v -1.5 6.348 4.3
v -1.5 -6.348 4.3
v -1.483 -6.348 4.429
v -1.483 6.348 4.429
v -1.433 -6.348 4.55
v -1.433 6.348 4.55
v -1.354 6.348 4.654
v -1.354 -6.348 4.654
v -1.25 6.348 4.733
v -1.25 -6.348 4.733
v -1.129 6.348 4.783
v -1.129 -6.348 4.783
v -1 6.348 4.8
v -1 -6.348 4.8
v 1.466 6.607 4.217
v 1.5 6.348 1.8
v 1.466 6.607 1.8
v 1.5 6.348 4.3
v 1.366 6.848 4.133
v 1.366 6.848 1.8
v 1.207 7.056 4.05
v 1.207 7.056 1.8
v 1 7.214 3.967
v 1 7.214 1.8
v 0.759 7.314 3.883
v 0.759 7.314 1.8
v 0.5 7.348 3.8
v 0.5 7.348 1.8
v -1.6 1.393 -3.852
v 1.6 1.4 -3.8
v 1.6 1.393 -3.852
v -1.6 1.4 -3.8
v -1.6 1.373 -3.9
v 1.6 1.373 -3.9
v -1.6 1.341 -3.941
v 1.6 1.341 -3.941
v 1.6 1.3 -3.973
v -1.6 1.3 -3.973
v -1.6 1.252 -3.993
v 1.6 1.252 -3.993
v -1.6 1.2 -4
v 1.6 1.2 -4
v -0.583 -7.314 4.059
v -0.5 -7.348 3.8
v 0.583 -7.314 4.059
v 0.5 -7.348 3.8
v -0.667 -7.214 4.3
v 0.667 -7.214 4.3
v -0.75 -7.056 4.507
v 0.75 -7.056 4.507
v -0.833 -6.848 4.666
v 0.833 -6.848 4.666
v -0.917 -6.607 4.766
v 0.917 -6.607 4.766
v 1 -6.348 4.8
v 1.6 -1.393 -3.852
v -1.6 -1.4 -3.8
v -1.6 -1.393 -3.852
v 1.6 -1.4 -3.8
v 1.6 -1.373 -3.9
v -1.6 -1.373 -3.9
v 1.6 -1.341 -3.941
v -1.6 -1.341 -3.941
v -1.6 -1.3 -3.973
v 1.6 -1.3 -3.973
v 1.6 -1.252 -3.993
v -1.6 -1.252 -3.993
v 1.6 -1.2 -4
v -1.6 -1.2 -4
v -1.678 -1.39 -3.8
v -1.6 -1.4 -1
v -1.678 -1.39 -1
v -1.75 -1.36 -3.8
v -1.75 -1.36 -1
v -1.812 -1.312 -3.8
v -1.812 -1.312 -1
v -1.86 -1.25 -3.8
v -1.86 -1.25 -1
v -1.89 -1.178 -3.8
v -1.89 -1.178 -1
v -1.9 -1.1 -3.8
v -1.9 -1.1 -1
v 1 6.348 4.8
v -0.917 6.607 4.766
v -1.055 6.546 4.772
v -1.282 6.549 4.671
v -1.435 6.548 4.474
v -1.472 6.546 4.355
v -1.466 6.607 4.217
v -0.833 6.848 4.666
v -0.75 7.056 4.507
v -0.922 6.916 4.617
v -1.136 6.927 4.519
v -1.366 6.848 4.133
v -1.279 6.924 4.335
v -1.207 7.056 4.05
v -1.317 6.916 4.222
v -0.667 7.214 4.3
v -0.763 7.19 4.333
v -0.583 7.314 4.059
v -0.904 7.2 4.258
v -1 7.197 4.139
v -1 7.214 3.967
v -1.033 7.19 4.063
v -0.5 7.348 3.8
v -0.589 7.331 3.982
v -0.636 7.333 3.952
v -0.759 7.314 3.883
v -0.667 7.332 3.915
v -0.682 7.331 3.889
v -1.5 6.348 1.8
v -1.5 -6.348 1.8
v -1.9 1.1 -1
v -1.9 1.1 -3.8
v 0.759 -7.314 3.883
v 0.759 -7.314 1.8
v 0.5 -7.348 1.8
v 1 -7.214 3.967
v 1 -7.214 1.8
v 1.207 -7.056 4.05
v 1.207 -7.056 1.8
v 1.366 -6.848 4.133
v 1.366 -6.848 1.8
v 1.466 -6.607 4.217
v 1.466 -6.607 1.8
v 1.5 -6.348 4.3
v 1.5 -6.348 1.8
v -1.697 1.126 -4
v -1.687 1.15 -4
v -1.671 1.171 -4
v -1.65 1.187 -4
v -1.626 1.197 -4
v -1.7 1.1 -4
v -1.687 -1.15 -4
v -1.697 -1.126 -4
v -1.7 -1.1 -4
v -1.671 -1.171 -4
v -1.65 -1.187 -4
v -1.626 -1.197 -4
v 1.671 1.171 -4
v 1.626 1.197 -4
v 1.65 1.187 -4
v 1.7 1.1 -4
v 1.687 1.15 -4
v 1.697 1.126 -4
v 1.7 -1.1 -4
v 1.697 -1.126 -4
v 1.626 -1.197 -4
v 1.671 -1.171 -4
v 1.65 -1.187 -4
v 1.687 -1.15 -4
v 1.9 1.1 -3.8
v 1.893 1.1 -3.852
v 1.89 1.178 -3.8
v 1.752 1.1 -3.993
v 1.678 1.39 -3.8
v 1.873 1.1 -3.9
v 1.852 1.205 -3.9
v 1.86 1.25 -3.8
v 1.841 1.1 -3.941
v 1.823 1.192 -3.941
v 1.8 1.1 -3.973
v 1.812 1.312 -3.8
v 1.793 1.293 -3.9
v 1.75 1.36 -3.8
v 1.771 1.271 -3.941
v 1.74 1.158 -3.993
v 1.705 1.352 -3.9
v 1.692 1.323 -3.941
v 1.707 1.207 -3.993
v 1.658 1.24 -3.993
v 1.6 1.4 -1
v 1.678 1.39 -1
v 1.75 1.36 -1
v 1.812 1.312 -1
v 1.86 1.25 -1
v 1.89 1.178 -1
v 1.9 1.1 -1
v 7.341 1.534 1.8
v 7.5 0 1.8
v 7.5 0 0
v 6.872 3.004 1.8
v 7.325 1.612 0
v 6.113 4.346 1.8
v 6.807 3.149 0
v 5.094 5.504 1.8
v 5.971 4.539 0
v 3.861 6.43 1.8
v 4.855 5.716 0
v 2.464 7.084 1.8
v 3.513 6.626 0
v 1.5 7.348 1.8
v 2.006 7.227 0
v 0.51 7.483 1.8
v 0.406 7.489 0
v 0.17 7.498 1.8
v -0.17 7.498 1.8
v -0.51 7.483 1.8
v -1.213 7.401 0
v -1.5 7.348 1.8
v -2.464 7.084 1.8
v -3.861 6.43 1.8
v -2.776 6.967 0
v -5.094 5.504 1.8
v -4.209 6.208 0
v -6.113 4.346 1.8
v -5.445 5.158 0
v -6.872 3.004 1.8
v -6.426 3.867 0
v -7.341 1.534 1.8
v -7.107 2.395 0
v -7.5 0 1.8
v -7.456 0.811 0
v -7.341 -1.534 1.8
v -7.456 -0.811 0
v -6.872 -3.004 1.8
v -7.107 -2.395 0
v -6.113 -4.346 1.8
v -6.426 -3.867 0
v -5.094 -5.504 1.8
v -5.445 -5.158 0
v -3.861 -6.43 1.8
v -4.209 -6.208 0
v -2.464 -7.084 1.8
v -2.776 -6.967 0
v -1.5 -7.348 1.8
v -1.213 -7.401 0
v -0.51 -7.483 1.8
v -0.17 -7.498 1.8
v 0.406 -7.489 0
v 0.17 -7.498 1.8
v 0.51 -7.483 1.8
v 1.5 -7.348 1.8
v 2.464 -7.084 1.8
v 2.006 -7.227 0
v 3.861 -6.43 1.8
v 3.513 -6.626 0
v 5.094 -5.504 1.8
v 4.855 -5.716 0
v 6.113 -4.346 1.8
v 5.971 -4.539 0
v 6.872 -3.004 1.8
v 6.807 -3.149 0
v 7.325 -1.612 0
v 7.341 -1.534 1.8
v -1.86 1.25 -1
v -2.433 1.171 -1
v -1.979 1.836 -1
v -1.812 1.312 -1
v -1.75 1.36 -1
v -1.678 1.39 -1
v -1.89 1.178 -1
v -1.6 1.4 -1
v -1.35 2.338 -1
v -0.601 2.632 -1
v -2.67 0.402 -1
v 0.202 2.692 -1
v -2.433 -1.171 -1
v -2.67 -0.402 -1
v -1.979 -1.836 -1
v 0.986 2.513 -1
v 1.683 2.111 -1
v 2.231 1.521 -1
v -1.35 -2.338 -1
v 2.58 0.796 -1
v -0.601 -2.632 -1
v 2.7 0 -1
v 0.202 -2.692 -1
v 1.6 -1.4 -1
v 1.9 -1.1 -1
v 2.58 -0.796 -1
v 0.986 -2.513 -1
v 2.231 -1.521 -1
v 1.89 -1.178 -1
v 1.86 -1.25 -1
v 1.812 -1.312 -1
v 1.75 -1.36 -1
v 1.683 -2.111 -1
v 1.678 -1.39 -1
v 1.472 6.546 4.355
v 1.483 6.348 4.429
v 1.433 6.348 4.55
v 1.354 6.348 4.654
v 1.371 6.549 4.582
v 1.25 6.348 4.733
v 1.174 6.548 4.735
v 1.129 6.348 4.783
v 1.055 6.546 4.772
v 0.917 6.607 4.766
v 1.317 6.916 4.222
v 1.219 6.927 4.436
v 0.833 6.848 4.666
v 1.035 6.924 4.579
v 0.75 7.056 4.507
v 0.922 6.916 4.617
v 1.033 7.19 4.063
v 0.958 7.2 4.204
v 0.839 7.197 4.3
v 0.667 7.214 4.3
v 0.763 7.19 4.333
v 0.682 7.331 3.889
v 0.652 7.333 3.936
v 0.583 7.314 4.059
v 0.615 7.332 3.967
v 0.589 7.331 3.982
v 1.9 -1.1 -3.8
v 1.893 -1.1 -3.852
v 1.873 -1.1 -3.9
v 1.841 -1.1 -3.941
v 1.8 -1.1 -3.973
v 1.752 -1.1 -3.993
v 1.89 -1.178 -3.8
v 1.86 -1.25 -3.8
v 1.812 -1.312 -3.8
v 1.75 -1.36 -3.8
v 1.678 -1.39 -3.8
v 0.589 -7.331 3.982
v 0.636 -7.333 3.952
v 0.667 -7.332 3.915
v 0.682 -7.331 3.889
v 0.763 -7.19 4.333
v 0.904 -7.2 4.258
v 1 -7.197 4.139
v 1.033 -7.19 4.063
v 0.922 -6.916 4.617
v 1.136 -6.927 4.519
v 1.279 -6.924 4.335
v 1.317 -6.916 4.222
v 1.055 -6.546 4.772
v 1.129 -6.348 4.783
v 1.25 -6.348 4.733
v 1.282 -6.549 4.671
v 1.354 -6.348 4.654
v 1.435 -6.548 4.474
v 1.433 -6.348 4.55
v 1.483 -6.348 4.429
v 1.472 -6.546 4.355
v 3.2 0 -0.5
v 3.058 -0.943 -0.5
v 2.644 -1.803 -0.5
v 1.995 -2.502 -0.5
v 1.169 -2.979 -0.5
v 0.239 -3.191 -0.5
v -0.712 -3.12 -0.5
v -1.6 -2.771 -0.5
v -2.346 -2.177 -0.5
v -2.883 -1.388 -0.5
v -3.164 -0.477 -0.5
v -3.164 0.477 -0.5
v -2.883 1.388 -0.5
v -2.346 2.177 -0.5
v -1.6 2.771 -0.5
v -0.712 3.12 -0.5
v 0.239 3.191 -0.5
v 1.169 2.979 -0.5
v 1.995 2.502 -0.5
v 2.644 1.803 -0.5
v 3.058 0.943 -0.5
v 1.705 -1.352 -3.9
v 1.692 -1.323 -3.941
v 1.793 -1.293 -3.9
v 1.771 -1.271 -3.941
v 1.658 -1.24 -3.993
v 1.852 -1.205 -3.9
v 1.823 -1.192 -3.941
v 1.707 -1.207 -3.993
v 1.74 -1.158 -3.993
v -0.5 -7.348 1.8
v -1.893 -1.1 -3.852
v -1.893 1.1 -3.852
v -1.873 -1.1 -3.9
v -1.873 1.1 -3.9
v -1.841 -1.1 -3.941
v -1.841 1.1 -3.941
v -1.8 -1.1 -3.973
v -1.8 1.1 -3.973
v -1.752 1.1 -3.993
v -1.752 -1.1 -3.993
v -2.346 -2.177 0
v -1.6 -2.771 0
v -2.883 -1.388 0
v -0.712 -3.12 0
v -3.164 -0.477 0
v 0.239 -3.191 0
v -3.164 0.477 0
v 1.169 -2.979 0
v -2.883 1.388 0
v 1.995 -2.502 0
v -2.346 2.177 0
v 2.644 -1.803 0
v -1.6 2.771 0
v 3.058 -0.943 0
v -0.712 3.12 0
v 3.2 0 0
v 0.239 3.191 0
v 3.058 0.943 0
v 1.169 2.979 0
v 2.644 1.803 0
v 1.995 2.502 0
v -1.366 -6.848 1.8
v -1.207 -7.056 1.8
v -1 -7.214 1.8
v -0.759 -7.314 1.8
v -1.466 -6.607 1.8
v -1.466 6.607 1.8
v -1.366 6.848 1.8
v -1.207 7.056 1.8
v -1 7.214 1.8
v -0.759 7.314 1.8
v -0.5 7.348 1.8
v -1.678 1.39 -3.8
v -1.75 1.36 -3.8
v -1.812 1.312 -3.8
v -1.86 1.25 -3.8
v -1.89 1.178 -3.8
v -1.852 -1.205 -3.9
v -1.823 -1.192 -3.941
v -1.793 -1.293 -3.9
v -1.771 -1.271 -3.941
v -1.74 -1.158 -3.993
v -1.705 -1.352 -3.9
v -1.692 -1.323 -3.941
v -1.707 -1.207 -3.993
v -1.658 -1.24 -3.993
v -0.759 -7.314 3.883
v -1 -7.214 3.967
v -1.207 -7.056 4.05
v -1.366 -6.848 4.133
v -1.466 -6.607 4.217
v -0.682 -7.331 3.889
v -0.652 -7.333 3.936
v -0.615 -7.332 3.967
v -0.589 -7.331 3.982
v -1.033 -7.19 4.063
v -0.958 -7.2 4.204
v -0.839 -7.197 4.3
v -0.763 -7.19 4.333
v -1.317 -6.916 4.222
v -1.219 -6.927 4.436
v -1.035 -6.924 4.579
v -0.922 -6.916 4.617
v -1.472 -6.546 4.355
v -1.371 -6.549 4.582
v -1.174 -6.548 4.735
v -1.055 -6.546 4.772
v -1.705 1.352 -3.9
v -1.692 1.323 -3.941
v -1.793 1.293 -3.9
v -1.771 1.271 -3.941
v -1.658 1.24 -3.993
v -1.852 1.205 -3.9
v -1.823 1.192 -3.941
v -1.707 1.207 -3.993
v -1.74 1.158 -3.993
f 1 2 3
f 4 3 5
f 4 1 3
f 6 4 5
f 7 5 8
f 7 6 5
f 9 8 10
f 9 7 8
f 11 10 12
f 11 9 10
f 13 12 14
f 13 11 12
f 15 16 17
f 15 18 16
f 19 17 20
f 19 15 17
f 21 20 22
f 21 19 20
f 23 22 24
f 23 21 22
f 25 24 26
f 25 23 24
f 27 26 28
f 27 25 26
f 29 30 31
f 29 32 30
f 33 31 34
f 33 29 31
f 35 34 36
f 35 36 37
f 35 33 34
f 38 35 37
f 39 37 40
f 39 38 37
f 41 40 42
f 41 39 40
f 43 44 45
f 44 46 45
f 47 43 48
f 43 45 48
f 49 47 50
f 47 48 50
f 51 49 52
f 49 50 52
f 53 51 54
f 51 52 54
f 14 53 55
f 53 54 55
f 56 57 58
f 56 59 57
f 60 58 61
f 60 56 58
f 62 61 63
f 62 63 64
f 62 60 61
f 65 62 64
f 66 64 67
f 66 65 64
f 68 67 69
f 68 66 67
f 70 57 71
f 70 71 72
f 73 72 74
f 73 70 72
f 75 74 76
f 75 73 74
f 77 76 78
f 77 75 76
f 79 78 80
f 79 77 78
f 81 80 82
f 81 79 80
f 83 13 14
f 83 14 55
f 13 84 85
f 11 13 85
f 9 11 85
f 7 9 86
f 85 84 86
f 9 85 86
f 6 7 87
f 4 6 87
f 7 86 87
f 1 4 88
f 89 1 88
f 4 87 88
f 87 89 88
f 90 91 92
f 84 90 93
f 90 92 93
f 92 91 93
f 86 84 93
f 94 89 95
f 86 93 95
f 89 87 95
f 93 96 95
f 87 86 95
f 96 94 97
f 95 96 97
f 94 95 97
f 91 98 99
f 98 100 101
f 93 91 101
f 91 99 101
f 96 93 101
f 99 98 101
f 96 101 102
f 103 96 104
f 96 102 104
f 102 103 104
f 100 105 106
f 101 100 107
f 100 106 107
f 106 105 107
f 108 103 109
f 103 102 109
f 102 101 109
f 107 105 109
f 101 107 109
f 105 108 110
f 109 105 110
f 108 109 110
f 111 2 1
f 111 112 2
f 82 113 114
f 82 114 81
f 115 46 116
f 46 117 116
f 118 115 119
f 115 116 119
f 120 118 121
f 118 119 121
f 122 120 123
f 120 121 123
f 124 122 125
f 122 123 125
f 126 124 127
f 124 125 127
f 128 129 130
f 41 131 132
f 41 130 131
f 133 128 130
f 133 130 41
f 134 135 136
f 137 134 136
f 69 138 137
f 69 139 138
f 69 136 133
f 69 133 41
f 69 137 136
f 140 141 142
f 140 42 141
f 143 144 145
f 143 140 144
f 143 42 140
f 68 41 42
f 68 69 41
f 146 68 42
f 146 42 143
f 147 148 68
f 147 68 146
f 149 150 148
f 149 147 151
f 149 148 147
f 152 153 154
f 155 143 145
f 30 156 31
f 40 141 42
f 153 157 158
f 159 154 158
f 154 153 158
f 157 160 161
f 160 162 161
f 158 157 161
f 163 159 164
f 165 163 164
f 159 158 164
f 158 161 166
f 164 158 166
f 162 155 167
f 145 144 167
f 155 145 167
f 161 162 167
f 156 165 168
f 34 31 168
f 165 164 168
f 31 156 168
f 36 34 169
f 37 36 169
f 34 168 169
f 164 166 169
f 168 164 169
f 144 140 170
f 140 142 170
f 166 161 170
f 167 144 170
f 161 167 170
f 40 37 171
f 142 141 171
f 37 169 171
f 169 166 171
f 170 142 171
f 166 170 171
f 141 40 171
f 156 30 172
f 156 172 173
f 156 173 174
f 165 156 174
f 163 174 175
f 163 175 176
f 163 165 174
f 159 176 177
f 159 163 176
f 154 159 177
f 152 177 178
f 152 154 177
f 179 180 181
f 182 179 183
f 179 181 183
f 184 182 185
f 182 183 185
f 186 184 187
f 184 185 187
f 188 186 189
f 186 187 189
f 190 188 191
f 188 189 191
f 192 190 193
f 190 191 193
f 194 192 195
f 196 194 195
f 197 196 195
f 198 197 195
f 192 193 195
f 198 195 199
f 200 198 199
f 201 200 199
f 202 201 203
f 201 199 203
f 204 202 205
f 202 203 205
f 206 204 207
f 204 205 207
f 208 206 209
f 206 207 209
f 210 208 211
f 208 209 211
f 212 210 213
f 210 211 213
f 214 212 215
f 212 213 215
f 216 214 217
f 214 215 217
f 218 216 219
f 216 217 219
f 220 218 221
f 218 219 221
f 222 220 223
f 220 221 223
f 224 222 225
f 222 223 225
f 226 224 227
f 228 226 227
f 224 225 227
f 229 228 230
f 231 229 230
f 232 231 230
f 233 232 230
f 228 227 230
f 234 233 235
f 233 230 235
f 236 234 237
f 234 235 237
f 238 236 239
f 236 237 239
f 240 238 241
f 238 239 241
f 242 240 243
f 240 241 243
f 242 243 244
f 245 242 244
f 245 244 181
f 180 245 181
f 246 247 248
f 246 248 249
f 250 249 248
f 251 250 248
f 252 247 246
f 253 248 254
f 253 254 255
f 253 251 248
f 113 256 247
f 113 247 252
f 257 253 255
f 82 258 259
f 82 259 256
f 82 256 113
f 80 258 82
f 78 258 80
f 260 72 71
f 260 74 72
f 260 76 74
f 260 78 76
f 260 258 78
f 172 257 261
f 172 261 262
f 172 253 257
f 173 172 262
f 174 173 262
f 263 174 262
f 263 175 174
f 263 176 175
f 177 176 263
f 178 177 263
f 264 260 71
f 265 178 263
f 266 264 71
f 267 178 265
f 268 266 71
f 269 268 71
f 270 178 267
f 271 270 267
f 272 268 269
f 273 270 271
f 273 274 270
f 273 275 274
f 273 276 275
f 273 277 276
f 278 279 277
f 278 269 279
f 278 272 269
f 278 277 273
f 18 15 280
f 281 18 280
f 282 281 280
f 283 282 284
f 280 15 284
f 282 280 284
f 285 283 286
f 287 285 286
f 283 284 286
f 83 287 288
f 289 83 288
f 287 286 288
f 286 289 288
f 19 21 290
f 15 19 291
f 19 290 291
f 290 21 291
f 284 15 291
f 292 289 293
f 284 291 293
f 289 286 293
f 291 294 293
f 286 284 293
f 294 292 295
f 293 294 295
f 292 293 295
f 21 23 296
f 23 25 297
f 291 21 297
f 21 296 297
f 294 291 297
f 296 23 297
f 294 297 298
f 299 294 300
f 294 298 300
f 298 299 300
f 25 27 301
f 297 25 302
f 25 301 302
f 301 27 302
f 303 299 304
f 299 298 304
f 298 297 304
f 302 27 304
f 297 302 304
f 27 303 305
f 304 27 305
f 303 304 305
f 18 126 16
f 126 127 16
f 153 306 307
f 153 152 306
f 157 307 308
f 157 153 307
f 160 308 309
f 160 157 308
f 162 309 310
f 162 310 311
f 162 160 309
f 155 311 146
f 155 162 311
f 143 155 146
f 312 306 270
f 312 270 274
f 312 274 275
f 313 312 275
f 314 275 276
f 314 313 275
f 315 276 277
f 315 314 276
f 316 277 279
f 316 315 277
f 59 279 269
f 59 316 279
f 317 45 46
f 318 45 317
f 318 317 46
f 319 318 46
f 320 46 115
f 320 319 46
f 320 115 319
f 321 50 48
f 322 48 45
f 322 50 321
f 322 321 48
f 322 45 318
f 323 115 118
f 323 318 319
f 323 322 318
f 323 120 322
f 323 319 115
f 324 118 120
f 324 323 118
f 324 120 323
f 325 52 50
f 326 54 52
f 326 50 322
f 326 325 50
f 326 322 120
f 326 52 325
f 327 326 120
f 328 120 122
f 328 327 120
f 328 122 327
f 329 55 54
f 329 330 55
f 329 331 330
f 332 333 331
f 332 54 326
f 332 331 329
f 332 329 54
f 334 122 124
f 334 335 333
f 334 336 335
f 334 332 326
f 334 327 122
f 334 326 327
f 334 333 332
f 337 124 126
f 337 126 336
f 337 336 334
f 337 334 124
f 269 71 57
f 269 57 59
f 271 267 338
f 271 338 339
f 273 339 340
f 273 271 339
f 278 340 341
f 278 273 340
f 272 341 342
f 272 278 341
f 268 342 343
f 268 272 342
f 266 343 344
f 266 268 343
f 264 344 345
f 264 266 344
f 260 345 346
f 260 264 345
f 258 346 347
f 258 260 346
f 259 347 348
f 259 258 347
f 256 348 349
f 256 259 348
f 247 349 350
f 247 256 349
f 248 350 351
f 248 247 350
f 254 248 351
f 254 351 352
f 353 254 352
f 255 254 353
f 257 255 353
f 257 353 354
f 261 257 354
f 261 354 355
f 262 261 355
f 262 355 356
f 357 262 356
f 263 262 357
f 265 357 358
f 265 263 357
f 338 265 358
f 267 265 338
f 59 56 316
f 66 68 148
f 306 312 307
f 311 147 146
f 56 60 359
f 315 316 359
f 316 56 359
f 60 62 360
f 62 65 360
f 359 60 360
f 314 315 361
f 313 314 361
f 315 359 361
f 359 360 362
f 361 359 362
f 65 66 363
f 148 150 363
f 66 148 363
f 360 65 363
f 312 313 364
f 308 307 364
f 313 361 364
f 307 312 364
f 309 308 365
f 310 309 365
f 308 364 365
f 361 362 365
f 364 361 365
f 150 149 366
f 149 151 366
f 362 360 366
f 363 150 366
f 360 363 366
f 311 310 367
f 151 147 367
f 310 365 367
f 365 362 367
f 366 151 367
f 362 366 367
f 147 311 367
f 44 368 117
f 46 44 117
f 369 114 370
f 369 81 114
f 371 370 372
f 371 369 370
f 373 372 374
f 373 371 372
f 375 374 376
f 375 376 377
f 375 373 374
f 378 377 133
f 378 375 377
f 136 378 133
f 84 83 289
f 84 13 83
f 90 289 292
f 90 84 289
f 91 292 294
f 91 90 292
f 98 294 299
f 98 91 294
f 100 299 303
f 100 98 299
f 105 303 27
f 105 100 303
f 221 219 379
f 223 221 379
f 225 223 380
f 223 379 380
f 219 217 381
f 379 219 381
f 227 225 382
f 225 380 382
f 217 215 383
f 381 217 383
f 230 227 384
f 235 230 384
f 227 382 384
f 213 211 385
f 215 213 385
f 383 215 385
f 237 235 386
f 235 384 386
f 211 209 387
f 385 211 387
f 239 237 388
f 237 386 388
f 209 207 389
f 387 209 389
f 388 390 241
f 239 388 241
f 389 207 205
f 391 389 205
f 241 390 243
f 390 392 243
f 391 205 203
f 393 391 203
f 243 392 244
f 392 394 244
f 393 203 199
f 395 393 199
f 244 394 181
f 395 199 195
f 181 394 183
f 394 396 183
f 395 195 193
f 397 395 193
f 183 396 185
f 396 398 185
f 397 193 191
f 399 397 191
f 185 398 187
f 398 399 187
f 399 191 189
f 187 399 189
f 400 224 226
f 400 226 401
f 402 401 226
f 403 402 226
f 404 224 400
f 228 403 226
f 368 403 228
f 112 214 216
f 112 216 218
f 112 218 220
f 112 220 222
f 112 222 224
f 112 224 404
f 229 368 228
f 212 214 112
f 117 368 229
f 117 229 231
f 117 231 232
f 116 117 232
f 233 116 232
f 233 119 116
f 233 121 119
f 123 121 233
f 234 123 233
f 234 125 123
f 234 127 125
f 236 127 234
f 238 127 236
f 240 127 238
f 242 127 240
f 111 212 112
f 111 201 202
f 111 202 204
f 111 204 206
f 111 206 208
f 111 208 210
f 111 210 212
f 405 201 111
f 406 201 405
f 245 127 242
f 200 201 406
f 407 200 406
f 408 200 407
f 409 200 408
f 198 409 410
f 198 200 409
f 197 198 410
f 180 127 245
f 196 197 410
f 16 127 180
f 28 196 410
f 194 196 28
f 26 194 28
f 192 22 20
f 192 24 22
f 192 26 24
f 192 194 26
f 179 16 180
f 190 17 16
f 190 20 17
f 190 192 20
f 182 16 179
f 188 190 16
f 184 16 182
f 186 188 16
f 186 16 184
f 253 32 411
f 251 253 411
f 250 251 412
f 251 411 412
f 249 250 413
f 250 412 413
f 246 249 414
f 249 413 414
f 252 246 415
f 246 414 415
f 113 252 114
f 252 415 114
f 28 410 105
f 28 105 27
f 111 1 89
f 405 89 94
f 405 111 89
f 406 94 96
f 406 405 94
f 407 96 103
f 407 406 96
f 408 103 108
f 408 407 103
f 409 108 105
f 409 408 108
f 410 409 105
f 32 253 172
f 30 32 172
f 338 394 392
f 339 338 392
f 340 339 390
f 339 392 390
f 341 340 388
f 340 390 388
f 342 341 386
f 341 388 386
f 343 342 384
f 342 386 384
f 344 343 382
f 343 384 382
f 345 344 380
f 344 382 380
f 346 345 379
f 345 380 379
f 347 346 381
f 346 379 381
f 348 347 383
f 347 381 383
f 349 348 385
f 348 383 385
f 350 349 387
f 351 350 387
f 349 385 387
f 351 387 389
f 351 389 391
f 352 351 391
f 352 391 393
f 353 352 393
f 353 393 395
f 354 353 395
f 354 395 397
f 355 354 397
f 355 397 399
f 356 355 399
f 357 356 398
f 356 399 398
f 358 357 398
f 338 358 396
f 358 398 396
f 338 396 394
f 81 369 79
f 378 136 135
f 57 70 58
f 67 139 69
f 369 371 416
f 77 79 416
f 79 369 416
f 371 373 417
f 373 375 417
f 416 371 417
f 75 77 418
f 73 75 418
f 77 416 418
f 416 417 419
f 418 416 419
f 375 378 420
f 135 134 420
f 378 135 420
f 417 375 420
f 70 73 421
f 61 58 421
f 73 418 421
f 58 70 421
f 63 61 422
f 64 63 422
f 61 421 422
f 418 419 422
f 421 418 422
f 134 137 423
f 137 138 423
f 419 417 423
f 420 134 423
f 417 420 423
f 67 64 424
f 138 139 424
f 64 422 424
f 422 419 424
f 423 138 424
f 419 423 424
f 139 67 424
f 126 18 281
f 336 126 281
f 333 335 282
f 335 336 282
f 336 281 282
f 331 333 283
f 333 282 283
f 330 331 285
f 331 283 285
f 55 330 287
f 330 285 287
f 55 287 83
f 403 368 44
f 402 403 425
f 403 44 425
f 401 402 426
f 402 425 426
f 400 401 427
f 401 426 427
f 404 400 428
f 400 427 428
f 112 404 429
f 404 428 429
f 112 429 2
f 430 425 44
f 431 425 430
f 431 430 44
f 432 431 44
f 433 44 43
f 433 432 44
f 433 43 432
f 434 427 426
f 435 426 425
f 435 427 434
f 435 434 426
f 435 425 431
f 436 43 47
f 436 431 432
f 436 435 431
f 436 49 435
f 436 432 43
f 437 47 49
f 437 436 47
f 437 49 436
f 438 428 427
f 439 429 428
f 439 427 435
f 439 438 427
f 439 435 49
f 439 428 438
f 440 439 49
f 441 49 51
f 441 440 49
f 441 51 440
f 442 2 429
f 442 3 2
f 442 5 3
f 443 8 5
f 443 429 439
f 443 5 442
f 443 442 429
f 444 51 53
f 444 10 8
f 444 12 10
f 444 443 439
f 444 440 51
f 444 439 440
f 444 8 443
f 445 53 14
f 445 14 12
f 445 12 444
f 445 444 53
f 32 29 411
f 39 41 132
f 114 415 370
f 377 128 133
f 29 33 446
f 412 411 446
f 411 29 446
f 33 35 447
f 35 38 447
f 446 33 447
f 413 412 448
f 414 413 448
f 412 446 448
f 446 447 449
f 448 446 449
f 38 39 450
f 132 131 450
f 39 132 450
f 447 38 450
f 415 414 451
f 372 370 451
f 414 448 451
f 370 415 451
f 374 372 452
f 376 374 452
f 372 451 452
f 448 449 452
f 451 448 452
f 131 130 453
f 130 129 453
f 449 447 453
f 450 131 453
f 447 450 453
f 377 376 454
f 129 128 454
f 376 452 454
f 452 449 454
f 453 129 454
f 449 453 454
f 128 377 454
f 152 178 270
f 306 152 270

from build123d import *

# Parameters (mm, degrees)
SKETCH008_R     = 7.5
PAD004_DEPTH    = 1.8
SKETCH009_W     = 3
SKETCH009_H     = 14.696938
PAD005_DEPTH    = 3
SKETCH010_R     = 3.2
PAD006_DEPTH    = 1
CHAMFER003_SIZE = 0.5
SKETCH011_W     = 3.8
SKETCH011_H     = 2.8
PAD007_DEPTH    = 3
FILLET004_R     = 0.3
FILLET005_R     = 0.2
FILLET006_R     = 0.5
FILLET_R        = 1
FILLET007_R     = 1


with BuildPart() as part:
    # Sketch008 → Pad004 (new body)
    with BuildSketch(Plane.XY):
        Circle(SKETCH008_R)
    extrude(amount=PAD004_DEPTH)

    # Sketch009 (on Face3 of Pad004) → Pad005 (join)
    with BuildSketch(Plane.XY.offset(1.8)):
        Rectangle(SKETCH009_W, SKETCH009_H)
    extrude(amount=PAD005_DEPTH)

    # Sketch010 → Pad006 (join)
    with BuildSketch(Plane(origin=(0, 0, 0), x_dir=(1, 0, 0), z_dir=(0, 0, -1))):
        Circle(SKETCH010_R)
    extrude(amount=PAD006_DEPTH)

    # Chamfer003
    chamfer003_edges = [part.edges().sort_by_distance(p)[0] for p in [
        (-3.2, 0, -1),
    ]]
    chamfer(chamfer003_edges, length=CHAMFER003_SIZE)

    # Sketch011 (on Face4 of Chamfer003) → Pad007 (join)
    with BuildSketch(Plane(origin=(0, 0, -1), x_dir=(1, 0, 0), z_dir=(0, 0, -1))):
        Rectangle(SKETCH011_W, SKETCH011_H)
    extrude(amount=PAD007_DEPTH)

    # Fillet004
    fillet004_edges = [part.edges().sort_by_distance(p)[0] for p in [
        (-1.9, 1.4, -2.5),
        (-1.9, -1.4, -2.5),
        (1.9, 1.4, -2.5),
        (1.9, -1.4, -2.5),
    ]]
    fillet(fillet004_edges, radius=FILLET004_R)

    # Fillet005
    fillet005_edges = [part.edges().sort_by_distance(p)[0] for p in [
        (0, -1.4, -4),
        (1.812132, -1.312132, -4),
        (1.9, 0, -4),
        (1.812132, 1.312132, -4),
        (0, 1.4, -4),
        (-1.812132, 1.312132, -4),
        (-1.9, 0, -4),
        (-1.812132, -1.312132, -4),
    ]]
    fillet(fillet005_edges, radius=FILLET005_R)

    # Fillet006
    fillet006_edges = [part.edges().sort_by_distance(p)[0] for p in [
        (-1.5, 0, 4.8),
        (1.5, 0, 4.8),
    ]]
    fillet(fillet006_edges, radius=FILLET006_R)

    # Fillet
    fillet_edges = [part.edges().sort_by_distance(p)[0] for p in [
        (-1.5, -7.348469, 3.05),
        (1.5, -7.348469, 3.05),
        (1.353553, -7.348469, 4.653553),
        (0, -7.348469, 4.8),
        (-1.353553, -7.348469, 4.653553),
    ]]
    fillet(fillet_edges, radius=FILLET_R)

    # Fillet007
    fillet007_edges = [part.edges().sort_by_distance(p)[0] for p in [
        (1.5, 7.348469, 3.05),
        (1.353553, 7.348469, 4.653553),
        (0, 7.348469, 4.8),
        (-1.353553, 7.348469, 4.653553),
        (-1.5, 7.348469, 3.05),
    ]]
    fillet(fillet007_edges, radius=FILLET007_R)


solid = part.part
